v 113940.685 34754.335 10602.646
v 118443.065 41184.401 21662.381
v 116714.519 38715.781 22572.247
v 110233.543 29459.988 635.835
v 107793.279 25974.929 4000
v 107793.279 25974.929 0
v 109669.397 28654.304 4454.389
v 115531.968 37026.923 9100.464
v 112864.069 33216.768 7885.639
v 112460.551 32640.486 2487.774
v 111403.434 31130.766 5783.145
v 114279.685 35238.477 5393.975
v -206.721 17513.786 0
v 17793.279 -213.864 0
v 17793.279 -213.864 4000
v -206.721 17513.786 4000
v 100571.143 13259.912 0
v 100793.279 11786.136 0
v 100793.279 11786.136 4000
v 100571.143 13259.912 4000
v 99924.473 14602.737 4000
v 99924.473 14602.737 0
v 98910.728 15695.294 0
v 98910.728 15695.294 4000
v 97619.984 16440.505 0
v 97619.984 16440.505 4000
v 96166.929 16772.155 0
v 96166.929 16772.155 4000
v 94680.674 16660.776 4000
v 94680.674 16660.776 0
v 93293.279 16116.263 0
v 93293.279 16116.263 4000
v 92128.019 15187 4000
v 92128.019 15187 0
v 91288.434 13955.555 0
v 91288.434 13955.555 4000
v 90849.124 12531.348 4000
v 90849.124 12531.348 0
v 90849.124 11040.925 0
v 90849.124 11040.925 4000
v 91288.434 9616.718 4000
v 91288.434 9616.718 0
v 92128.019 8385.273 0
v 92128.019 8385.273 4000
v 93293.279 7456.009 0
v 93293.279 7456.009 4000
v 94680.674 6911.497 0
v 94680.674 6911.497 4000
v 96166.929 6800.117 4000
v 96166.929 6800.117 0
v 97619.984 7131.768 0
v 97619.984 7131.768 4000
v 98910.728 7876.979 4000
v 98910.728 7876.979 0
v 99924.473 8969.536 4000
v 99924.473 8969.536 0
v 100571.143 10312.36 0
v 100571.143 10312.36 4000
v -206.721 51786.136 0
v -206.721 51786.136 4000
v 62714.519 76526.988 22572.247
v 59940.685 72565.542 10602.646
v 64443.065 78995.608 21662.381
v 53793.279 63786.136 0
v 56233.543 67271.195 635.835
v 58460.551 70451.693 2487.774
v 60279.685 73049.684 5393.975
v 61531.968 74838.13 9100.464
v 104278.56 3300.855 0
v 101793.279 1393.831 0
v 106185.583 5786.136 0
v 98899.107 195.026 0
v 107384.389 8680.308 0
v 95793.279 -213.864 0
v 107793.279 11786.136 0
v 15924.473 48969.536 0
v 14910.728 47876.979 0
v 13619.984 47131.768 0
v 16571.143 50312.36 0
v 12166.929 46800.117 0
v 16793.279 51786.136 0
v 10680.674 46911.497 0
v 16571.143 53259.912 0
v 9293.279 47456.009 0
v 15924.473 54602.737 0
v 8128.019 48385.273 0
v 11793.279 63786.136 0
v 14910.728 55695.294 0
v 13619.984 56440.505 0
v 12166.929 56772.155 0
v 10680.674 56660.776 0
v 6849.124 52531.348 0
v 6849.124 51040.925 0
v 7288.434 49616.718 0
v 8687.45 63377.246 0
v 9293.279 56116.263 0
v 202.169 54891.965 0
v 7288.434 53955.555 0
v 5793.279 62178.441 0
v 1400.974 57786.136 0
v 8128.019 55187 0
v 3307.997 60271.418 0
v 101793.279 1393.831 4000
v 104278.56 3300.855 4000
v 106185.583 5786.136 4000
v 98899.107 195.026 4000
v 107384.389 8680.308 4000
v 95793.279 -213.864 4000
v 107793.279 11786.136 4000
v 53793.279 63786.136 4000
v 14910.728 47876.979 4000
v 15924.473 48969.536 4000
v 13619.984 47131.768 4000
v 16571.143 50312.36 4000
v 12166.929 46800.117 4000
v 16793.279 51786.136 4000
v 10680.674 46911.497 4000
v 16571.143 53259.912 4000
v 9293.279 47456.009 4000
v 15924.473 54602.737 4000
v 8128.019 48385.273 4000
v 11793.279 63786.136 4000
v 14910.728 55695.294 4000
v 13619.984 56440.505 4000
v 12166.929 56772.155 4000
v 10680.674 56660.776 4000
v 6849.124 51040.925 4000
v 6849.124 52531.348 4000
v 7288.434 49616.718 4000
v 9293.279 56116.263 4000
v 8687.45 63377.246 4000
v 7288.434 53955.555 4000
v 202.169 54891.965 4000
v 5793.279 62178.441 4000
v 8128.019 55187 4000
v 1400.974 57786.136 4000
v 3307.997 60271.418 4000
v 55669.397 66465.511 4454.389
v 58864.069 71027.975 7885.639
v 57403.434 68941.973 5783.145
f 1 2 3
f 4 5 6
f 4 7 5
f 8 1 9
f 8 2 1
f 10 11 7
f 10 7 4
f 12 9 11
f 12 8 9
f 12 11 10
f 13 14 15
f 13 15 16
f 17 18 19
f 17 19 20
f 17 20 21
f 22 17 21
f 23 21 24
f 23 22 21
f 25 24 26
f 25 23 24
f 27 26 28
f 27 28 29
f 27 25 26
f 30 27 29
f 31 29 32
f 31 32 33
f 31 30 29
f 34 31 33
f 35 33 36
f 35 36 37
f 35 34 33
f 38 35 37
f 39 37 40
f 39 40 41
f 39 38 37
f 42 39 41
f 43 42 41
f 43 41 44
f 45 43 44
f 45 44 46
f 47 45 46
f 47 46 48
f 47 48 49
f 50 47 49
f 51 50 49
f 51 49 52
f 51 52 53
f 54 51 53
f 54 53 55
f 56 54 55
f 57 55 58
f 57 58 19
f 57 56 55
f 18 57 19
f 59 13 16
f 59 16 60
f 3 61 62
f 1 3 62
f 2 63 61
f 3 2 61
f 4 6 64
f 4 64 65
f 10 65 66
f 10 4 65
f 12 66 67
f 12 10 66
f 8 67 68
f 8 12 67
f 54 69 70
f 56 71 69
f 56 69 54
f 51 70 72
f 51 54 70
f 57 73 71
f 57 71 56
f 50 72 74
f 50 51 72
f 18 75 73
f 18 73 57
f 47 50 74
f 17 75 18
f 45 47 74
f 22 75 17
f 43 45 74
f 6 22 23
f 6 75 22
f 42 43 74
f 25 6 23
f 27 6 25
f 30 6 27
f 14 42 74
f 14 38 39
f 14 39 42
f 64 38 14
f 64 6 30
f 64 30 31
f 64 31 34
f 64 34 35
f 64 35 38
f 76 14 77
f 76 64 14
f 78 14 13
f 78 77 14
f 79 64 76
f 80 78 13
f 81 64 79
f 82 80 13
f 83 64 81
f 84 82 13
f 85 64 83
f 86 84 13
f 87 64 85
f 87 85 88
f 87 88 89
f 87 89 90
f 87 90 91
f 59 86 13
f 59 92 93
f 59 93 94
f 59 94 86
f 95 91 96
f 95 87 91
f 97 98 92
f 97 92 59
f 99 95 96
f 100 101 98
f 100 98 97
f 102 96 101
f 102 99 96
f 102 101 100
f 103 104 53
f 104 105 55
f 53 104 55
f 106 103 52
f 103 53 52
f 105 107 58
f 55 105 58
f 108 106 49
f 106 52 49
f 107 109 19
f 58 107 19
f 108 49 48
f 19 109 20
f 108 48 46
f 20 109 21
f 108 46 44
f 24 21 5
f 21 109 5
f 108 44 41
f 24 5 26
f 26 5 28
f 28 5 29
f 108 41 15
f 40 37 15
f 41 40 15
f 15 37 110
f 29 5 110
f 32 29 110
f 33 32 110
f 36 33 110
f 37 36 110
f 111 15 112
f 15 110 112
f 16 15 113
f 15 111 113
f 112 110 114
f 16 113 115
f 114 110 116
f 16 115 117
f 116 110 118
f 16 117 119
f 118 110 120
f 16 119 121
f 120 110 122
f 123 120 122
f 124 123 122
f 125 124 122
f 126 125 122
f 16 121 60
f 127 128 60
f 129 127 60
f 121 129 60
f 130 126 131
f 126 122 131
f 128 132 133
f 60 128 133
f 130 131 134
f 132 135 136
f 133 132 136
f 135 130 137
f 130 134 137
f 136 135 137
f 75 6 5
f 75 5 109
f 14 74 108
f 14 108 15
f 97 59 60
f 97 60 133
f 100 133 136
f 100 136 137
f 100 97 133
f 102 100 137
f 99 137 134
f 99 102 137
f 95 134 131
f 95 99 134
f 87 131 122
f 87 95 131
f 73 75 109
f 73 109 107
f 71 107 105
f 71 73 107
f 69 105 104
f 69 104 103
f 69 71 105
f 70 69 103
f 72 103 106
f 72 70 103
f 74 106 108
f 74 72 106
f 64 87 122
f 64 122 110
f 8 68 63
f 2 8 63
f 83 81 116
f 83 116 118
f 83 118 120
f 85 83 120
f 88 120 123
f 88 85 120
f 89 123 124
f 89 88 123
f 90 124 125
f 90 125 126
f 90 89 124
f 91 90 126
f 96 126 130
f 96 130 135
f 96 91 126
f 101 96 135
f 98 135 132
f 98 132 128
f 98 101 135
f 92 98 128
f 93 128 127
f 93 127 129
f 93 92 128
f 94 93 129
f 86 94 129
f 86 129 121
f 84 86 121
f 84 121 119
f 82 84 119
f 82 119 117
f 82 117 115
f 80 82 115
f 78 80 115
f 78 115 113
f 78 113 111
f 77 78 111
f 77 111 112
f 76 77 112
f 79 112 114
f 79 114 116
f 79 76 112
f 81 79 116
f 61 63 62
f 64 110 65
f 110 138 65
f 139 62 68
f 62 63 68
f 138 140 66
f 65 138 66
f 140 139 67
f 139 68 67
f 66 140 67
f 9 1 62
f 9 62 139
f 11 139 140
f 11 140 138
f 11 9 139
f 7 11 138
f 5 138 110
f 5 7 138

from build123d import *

# Parameters (mm, degrees)
SKETCH1_R           = 5000
BOSS_EXTRUDE1_DEPTH = 4000
BOSS_EXTRUDE2_DEPTH = 65921.827793


with BuildPart() as part:
    # Sketch1 → Boss-Extrude1 (new body)
    with BuildSketch(Plane.XY):
        with BuildLine():
            Line((11793.278630485, 63786.136250361), (53793.278630484, 63786.136250361))
            Line((53793.278630484, 63786.136250361), (107793.278630484, 25974.929187037))
            Line((107793.278630484, 25974.929187037), (107793.278630484, 11786.136250361))
            ThreePointArc((107793.278630484, 11786.136250361), (104278.560004723, 3300.854876123), (95793.278630484, -213.863749639))
            Line((95793.278630484, -213.863749639), (17793.278630484, -213.863749639))
            Line((17793.278630484, -213.863749639), (-206.721369516, 17513.785772275))
            Line((-206.721369516, 17513.785772275), (-206.721369516, 51786.136250361))
            ThreePointArc((-206.721369516, 51786.136250361), (3307.997256246, 60271.4176246), (11793.278630485, 63786.136250361))
        make_face()
        with Locations((11793.278630484, 51786.136250361)):
            Circle(SKETCH1_R, mode=Mode.SUBTRACT)
        with Locations((95793.278630484, 11786.136250361)):
            Circle(SKETCH1_R, mode=Mode.SUBTRACT)
    extrude(amount=BOSS_EXTRUDE1_DEPTH)

    # Sketch5 → Boss-Extrude2 (add)
    with BuildSketch(Plane(origin=(60126.150977366, -42100.784157887, 0), x_dir=(0, 0, -1), z_dir=(0.8191520442889906, -0.5735764363510479, 0))):
        with BuildLine():
            Line((-4000, 83105.100963292), (0, 83105.100963292))
            ThreePointArc((0, 83105.100963292), (-2487.773930273, 91242.24283732), (-9100.463980983, 96597.093656853))
            Line((-9100.463980983, 96597.093656853), (-21662.380736448, 101672.437472819))
            Line((-21662.380736448, 101672.437472819), (-22572.246739713, 98658.809181653))
            Line((-22572.246739713, 98658.809181653), (-10602.646287059, 93822.776686013))
            ThreePointArc((-10602.646287059, 93822.776686013), (-5783.145186622, 89399.215493737), (-4000, 83105.100963292))
        make_face()
    extrude(amount=-BOSS_EXTRUDE2_DEPTH)


solid = part.part
